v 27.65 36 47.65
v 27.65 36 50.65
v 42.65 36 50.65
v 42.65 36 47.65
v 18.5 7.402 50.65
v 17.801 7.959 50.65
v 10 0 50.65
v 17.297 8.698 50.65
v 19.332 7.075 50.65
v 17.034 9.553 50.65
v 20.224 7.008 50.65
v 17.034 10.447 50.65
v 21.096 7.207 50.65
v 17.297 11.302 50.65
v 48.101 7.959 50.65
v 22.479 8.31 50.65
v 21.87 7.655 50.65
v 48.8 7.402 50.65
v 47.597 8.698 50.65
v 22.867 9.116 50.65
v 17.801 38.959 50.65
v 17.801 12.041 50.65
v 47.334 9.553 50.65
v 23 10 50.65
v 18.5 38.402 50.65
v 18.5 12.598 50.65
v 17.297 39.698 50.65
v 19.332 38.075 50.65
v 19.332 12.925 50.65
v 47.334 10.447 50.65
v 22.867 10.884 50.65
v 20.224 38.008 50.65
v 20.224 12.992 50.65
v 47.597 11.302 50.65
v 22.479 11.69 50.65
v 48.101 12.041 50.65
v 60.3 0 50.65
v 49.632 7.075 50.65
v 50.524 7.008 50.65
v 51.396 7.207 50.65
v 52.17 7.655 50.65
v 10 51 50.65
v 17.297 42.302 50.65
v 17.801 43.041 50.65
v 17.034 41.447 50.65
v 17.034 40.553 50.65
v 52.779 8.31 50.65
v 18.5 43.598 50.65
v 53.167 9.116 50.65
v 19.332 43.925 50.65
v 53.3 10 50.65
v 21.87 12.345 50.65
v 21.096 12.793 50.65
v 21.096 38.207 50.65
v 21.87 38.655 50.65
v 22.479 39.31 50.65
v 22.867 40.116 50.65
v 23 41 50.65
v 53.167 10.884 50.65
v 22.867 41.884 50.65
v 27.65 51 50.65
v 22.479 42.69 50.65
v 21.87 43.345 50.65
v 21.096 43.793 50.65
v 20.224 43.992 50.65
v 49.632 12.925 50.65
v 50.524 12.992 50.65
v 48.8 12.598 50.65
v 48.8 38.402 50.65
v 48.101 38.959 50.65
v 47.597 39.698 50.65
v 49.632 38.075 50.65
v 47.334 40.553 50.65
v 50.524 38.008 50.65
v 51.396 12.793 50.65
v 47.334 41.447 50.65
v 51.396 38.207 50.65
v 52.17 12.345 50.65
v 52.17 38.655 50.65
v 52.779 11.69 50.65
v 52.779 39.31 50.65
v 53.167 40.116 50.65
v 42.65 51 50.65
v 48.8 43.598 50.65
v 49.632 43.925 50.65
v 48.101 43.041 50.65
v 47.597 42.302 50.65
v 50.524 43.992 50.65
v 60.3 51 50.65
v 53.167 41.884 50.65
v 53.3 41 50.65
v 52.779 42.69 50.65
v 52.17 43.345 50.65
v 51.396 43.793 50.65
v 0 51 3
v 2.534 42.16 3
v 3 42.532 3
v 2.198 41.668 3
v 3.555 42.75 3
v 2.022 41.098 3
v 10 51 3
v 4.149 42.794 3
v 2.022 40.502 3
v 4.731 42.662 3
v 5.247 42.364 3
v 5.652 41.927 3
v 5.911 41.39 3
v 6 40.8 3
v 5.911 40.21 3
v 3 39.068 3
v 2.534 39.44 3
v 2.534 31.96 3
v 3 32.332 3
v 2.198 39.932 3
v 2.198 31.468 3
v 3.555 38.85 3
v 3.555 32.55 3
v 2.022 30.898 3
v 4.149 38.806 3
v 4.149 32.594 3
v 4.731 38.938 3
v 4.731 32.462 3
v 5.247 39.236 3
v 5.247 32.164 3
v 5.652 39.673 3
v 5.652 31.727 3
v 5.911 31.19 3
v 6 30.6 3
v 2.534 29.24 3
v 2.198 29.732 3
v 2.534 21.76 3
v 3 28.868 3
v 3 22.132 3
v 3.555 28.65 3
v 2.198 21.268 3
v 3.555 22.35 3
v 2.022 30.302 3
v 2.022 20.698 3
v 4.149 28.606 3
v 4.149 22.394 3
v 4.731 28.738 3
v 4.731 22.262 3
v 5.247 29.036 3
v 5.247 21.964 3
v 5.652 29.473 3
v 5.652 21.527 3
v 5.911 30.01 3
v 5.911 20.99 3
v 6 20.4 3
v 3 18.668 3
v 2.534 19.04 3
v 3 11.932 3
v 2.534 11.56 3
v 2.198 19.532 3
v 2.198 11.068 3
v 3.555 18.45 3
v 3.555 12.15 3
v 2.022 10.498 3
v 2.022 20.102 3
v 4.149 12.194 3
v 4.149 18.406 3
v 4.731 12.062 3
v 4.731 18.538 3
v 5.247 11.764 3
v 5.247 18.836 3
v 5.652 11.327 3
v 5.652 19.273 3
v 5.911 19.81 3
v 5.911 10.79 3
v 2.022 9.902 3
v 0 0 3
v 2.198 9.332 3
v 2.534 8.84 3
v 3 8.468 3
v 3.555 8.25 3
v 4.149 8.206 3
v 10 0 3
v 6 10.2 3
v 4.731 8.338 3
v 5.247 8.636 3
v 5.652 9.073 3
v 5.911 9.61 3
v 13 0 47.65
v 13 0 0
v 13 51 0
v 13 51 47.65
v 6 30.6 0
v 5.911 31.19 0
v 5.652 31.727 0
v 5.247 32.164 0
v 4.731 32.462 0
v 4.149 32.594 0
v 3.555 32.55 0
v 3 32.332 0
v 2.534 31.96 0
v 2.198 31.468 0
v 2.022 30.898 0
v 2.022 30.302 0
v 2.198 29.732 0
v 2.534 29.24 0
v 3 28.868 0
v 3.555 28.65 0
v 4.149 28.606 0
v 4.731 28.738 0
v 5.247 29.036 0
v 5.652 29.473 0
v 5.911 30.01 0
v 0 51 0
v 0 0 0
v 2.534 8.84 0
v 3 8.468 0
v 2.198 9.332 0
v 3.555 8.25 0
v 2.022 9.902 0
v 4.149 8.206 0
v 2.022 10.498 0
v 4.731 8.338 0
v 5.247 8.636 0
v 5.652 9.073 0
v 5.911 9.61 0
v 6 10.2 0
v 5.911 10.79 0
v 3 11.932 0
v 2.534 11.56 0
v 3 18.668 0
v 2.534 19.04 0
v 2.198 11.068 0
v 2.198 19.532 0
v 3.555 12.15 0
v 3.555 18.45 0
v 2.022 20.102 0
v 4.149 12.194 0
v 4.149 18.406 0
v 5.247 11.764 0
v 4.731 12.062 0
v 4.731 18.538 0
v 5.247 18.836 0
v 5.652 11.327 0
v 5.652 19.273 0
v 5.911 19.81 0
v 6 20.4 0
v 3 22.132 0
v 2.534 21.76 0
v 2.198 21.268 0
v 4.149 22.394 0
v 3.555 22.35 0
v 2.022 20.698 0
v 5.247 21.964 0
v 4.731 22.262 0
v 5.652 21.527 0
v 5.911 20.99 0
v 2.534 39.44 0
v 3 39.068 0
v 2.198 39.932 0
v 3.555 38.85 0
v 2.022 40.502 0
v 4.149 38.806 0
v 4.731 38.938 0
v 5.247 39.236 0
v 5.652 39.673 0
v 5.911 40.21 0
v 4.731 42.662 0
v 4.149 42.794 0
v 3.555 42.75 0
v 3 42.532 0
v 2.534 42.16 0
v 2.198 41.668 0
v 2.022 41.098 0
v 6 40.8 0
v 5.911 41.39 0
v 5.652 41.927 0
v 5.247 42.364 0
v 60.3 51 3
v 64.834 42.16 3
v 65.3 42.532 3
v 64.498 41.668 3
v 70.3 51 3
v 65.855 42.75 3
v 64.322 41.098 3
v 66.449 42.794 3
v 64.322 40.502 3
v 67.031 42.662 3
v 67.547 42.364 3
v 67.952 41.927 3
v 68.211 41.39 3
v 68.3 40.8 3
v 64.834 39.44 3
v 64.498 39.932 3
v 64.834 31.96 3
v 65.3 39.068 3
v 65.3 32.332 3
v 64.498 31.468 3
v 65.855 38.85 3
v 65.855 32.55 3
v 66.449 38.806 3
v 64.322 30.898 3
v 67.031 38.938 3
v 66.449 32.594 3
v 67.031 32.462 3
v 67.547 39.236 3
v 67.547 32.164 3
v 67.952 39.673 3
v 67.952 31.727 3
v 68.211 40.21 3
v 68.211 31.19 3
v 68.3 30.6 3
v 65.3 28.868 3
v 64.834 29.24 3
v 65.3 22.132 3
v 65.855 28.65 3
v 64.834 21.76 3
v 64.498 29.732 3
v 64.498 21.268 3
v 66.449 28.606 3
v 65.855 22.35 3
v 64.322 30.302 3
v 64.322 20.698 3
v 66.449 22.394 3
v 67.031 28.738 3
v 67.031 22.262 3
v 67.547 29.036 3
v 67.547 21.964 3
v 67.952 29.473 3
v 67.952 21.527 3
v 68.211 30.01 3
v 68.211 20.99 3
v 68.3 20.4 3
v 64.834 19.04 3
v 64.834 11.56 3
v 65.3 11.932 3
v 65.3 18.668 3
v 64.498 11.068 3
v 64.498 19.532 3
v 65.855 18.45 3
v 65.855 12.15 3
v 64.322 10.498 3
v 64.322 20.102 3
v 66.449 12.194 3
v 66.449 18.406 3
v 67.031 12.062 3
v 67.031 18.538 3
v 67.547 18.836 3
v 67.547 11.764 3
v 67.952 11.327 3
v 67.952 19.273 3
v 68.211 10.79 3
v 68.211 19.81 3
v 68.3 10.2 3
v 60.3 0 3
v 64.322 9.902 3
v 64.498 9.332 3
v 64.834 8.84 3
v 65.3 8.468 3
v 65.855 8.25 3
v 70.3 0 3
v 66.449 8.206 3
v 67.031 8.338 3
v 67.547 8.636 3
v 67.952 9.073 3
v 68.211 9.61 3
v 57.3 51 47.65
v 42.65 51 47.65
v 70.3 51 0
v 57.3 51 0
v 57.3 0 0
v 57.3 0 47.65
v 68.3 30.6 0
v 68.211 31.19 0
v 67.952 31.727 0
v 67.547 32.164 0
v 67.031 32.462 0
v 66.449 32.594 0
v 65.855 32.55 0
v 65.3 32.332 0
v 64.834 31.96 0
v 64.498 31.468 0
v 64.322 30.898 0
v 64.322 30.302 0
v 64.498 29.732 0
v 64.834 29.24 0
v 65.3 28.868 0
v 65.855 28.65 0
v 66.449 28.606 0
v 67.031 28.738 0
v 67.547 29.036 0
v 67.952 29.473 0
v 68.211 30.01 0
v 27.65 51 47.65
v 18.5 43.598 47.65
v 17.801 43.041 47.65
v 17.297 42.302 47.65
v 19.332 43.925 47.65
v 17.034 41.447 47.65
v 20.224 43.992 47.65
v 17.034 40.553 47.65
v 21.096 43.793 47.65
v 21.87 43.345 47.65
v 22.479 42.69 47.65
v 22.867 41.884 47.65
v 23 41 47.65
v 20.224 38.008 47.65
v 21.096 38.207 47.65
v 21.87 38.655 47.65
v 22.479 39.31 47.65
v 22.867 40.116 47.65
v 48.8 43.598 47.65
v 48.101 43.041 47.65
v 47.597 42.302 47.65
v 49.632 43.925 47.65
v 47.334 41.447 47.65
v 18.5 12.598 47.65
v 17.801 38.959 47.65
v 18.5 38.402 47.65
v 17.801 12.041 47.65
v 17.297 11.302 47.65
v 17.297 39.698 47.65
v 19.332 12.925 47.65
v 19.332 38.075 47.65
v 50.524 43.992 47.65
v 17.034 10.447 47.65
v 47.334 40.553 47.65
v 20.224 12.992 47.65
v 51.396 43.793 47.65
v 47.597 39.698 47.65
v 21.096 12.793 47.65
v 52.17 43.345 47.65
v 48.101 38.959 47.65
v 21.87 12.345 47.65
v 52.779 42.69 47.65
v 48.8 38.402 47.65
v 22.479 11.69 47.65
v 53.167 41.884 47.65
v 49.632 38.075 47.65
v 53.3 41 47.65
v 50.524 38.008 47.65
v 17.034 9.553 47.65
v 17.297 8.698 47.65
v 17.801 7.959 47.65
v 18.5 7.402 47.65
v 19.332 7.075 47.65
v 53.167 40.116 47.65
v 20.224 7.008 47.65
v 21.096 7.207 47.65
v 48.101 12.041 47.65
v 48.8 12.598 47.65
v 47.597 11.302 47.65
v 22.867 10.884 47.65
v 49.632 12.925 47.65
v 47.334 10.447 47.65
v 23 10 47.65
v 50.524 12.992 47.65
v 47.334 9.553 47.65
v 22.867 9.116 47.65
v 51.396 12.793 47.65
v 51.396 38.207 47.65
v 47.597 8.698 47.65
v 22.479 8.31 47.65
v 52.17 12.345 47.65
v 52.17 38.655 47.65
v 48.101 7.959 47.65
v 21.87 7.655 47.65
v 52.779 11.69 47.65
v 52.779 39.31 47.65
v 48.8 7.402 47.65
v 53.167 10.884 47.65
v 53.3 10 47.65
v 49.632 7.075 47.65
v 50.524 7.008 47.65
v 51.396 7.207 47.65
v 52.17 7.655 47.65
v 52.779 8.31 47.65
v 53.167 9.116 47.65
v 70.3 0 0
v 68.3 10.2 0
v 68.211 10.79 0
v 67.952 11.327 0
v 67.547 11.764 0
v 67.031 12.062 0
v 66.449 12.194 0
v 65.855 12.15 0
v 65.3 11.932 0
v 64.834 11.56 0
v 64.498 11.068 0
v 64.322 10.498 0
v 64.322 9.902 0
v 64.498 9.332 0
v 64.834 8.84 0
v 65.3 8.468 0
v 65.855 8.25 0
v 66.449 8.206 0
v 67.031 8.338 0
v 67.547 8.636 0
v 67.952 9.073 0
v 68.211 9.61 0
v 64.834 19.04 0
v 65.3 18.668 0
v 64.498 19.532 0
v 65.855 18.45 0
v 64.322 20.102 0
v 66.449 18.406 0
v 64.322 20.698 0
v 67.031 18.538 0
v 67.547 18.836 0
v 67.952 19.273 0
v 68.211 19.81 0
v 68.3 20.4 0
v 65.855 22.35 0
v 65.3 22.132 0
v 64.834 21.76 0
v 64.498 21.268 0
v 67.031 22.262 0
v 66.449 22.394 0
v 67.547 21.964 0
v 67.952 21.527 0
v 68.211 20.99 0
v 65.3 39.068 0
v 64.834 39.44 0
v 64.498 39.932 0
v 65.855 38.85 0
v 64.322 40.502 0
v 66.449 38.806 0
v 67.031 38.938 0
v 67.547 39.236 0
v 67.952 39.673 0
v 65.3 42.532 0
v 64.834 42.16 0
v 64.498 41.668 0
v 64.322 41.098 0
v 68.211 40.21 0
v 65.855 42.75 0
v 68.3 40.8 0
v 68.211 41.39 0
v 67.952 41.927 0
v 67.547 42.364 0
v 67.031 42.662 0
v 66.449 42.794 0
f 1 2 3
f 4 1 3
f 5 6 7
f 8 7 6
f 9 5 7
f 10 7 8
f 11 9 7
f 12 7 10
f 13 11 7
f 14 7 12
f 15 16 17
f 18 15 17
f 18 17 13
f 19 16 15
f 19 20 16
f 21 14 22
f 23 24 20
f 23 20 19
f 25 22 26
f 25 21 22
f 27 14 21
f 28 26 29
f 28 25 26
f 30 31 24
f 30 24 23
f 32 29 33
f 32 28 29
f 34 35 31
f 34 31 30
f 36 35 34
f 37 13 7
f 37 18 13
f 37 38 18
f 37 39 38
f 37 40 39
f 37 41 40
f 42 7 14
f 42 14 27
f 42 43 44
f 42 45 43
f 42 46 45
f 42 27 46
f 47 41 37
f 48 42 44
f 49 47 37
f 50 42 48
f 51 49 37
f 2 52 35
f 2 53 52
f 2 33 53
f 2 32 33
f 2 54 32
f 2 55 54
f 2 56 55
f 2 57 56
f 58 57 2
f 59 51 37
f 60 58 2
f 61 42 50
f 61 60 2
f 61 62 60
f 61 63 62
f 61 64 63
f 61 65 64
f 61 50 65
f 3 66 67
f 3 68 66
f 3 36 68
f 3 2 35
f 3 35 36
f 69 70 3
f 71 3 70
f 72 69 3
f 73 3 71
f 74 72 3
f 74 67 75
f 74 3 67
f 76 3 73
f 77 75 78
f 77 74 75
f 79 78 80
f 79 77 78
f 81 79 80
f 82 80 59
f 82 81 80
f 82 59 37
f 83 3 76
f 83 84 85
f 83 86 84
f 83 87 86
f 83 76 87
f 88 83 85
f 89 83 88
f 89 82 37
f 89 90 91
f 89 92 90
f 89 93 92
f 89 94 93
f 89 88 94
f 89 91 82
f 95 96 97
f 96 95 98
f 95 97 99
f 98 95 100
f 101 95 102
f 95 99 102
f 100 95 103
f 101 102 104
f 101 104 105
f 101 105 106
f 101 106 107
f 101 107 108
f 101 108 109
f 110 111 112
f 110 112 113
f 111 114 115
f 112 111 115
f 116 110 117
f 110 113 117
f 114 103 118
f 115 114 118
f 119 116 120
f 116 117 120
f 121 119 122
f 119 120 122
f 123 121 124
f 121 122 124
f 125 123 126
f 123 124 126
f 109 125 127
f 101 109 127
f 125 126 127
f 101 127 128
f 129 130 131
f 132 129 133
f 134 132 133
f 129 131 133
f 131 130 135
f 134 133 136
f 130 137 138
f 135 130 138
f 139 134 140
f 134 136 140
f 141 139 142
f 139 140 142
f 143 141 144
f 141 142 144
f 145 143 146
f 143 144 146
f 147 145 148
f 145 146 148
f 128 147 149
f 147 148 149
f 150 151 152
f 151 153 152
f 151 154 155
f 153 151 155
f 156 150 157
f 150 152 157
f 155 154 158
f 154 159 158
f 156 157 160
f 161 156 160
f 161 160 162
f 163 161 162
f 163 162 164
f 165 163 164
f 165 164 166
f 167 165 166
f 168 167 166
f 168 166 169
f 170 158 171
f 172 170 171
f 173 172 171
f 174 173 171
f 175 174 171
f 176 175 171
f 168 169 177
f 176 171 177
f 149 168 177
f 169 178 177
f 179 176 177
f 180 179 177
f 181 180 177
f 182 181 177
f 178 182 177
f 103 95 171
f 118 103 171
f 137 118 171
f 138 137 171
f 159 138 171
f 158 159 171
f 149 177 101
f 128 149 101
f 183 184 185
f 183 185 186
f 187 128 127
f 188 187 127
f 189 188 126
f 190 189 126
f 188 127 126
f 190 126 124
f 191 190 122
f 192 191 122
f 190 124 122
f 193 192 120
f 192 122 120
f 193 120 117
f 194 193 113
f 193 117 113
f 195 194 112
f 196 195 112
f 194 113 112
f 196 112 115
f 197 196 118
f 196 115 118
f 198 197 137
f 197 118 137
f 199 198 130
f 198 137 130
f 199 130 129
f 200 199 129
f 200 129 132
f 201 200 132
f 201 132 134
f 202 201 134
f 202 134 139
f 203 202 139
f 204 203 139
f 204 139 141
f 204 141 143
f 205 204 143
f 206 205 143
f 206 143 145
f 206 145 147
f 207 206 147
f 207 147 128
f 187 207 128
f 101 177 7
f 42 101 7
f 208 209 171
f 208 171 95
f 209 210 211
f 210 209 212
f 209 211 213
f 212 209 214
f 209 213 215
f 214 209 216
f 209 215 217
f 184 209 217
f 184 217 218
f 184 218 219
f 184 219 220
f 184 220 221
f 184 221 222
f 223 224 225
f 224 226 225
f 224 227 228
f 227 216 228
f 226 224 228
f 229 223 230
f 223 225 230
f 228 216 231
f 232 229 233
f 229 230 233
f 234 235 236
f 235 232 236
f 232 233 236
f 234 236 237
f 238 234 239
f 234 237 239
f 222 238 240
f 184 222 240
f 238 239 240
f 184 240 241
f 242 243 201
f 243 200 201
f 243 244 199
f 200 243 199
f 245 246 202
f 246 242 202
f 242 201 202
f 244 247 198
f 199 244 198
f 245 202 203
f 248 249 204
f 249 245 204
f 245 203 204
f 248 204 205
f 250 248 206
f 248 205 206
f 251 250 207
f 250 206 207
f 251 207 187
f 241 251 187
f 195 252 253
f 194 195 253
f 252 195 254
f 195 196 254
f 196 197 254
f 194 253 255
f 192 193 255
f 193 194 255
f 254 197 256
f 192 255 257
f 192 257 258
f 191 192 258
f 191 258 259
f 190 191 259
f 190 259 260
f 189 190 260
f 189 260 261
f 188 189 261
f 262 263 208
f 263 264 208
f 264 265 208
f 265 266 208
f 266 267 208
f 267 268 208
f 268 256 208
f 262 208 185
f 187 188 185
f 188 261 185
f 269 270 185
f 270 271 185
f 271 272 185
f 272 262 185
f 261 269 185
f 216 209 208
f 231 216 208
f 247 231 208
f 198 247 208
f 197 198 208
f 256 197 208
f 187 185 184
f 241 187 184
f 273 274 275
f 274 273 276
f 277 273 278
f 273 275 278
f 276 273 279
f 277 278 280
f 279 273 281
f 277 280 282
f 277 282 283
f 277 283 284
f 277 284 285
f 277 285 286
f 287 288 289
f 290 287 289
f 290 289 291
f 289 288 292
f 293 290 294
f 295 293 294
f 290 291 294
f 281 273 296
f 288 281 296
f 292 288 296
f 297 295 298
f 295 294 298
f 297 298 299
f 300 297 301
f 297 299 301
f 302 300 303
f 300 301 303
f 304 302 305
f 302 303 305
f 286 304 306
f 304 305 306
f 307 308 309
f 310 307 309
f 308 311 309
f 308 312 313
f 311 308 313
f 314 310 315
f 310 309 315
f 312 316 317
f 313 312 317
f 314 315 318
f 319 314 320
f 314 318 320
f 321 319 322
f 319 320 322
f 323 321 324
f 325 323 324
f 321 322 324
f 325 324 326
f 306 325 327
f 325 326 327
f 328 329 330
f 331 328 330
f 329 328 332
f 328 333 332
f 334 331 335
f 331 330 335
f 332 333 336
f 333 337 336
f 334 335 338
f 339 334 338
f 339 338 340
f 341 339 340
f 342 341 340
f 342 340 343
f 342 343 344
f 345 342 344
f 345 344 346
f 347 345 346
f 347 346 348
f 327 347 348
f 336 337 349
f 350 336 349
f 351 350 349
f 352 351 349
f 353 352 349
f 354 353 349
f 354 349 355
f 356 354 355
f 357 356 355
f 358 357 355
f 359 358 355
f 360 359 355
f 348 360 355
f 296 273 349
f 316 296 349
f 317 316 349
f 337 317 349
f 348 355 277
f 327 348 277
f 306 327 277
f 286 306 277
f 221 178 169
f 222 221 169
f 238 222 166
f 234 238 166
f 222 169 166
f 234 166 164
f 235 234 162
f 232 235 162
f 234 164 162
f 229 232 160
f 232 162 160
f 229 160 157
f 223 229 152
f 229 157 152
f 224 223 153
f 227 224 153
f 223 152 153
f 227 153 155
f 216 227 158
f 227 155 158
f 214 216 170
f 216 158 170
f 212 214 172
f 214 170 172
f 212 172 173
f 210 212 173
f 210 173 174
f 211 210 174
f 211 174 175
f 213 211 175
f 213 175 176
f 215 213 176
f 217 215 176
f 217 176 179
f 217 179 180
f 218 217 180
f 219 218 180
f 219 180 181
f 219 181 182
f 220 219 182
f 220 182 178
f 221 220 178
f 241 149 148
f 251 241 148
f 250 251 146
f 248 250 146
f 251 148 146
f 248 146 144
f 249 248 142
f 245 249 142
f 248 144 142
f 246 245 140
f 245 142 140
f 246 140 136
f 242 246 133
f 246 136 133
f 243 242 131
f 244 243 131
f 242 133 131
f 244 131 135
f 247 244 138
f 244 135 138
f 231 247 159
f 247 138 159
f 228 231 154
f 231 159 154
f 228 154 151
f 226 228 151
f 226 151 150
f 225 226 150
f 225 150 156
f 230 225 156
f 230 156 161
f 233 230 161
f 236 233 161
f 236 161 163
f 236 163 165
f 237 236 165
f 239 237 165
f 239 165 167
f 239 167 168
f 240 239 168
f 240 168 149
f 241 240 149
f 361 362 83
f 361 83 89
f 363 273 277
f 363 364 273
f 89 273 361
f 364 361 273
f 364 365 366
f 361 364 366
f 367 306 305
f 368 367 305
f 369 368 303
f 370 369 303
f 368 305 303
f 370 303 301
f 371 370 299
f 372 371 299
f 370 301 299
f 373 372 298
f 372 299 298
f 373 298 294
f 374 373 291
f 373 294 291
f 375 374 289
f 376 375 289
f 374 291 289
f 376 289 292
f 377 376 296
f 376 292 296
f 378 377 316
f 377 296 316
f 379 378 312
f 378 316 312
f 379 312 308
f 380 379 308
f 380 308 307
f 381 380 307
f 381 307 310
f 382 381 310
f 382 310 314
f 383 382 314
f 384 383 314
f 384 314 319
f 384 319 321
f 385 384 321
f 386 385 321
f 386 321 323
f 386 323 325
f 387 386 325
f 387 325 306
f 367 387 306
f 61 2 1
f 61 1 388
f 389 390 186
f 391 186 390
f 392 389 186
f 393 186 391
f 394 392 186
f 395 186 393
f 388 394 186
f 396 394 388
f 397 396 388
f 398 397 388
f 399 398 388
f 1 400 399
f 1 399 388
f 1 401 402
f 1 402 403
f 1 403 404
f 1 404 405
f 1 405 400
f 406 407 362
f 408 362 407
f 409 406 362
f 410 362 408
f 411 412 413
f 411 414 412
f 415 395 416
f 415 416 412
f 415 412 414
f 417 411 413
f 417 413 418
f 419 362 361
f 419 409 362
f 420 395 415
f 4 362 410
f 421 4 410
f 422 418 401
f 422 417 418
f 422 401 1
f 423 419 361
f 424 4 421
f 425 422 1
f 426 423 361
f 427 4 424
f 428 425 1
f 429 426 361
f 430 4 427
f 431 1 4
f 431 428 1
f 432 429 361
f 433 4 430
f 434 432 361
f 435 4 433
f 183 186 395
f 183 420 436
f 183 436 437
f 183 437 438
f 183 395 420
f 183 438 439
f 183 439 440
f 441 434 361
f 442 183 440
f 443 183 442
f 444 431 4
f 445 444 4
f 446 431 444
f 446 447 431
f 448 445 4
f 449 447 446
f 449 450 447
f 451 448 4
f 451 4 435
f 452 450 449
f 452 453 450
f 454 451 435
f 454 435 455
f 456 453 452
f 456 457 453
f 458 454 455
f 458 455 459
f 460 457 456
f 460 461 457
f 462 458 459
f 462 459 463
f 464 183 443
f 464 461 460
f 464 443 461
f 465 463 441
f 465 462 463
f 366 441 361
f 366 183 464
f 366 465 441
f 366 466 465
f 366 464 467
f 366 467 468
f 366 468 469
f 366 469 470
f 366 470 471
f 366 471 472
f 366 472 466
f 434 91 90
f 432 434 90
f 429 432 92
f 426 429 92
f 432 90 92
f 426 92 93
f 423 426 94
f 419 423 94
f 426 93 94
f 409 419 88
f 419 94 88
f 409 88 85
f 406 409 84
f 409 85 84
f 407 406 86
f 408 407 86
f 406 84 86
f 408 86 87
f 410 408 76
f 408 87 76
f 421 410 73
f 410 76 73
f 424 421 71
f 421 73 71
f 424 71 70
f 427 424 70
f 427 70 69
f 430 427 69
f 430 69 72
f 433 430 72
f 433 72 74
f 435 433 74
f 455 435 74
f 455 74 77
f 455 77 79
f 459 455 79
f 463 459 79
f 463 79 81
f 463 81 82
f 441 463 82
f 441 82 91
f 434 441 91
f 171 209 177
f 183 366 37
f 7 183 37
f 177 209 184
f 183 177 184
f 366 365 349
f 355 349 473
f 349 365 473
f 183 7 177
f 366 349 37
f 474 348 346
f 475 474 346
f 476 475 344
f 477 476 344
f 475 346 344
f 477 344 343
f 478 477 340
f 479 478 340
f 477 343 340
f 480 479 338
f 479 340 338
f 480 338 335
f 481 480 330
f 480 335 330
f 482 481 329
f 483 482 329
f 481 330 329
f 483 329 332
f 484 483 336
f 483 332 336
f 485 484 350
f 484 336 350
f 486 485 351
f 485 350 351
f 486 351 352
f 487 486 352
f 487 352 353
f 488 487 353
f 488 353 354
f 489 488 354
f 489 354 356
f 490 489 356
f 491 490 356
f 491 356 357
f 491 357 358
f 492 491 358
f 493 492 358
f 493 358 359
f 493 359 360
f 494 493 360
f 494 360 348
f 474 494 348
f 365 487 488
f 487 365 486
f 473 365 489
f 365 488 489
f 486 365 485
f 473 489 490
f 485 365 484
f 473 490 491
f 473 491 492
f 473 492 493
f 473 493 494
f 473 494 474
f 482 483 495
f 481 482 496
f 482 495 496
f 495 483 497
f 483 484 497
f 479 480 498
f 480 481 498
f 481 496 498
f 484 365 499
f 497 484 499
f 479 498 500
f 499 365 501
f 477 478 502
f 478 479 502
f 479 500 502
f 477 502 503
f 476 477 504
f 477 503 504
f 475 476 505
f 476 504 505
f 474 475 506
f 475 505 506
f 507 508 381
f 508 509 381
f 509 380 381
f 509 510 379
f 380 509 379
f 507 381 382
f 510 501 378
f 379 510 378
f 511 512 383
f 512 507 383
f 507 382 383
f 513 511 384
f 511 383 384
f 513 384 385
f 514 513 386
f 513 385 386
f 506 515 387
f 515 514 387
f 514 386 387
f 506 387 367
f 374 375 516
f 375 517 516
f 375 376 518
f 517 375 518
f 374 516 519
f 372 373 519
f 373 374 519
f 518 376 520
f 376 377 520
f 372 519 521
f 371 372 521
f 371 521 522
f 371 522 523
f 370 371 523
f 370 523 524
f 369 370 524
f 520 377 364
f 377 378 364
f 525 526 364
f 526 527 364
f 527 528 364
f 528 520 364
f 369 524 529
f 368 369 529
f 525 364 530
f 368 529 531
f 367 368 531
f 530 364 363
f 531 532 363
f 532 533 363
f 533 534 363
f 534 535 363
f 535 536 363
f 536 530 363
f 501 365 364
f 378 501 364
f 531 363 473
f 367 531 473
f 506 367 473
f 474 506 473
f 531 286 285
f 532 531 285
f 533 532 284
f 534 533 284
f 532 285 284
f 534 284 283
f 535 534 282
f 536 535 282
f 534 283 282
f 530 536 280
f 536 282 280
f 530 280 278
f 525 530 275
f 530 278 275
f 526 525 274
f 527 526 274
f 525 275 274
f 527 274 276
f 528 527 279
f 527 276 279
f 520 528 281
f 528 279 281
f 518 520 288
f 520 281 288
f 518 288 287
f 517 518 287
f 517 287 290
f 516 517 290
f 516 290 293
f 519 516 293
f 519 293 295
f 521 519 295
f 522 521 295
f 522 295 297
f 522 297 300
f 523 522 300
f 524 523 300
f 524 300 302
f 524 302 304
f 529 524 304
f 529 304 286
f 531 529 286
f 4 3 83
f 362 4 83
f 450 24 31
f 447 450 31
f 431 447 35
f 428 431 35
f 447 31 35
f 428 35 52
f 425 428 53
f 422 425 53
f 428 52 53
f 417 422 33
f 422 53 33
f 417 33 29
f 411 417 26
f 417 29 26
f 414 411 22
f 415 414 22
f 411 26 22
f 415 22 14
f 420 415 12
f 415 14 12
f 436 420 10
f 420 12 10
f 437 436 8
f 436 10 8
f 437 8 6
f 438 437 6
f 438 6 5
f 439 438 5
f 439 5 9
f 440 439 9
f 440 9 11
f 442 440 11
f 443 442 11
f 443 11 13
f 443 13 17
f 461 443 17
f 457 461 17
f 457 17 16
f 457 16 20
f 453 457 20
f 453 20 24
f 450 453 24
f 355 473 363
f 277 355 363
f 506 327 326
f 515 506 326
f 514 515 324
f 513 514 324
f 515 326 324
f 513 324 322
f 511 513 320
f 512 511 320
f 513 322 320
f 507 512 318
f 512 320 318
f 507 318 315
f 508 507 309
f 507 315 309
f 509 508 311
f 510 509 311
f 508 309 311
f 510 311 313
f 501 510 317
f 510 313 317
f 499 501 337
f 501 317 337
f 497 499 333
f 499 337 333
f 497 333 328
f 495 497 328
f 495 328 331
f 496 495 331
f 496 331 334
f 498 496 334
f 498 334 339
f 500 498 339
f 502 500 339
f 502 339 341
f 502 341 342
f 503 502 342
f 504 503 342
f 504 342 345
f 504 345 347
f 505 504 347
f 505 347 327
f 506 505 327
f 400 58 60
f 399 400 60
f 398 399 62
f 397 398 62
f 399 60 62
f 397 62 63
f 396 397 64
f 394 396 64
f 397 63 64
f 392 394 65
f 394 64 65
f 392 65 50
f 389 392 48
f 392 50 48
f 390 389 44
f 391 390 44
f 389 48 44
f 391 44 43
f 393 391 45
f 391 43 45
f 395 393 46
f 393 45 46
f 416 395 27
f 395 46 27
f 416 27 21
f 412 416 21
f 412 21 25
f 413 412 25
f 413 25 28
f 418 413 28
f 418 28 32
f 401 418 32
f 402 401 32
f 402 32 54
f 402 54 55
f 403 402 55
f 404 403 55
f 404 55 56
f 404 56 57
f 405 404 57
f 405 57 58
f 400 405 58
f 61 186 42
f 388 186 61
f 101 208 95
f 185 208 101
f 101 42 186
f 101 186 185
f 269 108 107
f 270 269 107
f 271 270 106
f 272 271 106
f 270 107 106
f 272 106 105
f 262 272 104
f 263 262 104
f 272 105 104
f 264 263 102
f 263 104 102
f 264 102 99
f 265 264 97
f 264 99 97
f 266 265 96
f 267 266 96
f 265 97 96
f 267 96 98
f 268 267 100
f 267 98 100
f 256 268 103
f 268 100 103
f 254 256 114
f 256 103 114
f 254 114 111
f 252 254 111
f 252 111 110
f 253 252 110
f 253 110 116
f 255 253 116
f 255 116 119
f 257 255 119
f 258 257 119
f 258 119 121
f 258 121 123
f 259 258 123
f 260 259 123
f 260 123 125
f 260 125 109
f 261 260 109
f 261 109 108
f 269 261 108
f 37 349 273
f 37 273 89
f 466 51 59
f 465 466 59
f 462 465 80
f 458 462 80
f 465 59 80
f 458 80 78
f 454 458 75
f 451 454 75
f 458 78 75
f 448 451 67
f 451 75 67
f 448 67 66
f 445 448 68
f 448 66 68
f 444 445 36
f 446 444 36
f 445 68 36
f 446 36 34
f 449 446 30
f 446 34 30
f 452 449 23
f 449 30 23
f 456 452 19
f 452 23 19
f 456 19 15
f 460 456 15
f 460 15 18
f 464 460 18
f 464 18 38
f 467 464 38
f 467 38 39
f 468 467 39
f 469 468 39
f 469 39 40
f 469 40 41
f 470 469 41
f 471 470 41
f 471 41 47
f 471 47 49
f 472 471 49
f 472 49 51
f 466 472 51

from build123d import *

# Parameters (mm, degrees)
SKETCH_W        = 70.3
SKETCH_H        = 51
PAD_DEPTH       = 50.65
SKETCH001_W     = 44.3
SKETCH001_H     = 47.65
SKETCH001_W_2   = 10
POCKET_DEPTH    = 51.001
SKETCH002_R     = 3
SKETCH002_R_2   = 2
SKETCH002_W     = 15
SKETCH002_H     = 15
POCKET001_DEPTH = 50.651


with BuildPart() as part:
    # Sketch → Pad (new body)
    with BuildSketch(Plane.XY):
        with Locations((35.15, 25.5)):
            Rectangle(SKETCH_W, SKETCH_H)
    extrude(amount=PAD_DEPTH)

    # Sketch001 → Pocket (cut, through all)
    with BuildSketch(Plane.XZ):
        with Locations((35.15, 23.825)):
            Rectangle(SKETCH001_W, SKETCH001_H)
        with Locations((5, 26.825)):
            Rectangle(SKETCH001_W_2, SKETCH001_H)
        with Locations((65.3, 26.825)):
            Rectangle(SKETCH001_W_2, SKETCH001_H)
    extrude(amount=-POCKET_DEPTH, mode=Mode.SUBTRACT)

    # Sketch002 → Pocket001 (cut, through all)
    with BuildSketch(Plane.XY.offset(50.65)):
        with Locations((20, 41)):
            Circle(SKETCH002_R)
        with Locations((50.3, 41)):
            Circle(SKETCH002_R)
        with Locations((20, 10)):
            Circle(SKETCH002_R)
        with Locations((50.3, 10)):
            Circle(SKETCH002_R)
        with Locations((4, 40.8)):
            Circle(SKETCH002_R_2)
        with Locations((4, 30.6)):
            Circle(SKETCH002_R_2)
        with Locations((4, 20.4)):
            Circle(SKETCH002_R_2)
        with Locations((4, 10.2)):
            Circle(SKETCH002_R_2)
        with Locations((66.3, 40.8)):
            Circle(SKETCH002_R_2)
        with Locations((66.3, 30.6)):
            Circle(SKETCH002_R_2)
        with Locations((66.3, 20.4)):
            Circle(SKETCH002_R_2)
        with Locations((66.3, 10.2)):
            Circle(SKETCH002_R_2)
        with Locations((35.15, 43.5)):
            Rectangle(SKETCH002_W, SKETCH002_H)
    extrude(amount=-POCKET001_DEPTH, mode=Mode.SUBTRACT)


solid = part.part
